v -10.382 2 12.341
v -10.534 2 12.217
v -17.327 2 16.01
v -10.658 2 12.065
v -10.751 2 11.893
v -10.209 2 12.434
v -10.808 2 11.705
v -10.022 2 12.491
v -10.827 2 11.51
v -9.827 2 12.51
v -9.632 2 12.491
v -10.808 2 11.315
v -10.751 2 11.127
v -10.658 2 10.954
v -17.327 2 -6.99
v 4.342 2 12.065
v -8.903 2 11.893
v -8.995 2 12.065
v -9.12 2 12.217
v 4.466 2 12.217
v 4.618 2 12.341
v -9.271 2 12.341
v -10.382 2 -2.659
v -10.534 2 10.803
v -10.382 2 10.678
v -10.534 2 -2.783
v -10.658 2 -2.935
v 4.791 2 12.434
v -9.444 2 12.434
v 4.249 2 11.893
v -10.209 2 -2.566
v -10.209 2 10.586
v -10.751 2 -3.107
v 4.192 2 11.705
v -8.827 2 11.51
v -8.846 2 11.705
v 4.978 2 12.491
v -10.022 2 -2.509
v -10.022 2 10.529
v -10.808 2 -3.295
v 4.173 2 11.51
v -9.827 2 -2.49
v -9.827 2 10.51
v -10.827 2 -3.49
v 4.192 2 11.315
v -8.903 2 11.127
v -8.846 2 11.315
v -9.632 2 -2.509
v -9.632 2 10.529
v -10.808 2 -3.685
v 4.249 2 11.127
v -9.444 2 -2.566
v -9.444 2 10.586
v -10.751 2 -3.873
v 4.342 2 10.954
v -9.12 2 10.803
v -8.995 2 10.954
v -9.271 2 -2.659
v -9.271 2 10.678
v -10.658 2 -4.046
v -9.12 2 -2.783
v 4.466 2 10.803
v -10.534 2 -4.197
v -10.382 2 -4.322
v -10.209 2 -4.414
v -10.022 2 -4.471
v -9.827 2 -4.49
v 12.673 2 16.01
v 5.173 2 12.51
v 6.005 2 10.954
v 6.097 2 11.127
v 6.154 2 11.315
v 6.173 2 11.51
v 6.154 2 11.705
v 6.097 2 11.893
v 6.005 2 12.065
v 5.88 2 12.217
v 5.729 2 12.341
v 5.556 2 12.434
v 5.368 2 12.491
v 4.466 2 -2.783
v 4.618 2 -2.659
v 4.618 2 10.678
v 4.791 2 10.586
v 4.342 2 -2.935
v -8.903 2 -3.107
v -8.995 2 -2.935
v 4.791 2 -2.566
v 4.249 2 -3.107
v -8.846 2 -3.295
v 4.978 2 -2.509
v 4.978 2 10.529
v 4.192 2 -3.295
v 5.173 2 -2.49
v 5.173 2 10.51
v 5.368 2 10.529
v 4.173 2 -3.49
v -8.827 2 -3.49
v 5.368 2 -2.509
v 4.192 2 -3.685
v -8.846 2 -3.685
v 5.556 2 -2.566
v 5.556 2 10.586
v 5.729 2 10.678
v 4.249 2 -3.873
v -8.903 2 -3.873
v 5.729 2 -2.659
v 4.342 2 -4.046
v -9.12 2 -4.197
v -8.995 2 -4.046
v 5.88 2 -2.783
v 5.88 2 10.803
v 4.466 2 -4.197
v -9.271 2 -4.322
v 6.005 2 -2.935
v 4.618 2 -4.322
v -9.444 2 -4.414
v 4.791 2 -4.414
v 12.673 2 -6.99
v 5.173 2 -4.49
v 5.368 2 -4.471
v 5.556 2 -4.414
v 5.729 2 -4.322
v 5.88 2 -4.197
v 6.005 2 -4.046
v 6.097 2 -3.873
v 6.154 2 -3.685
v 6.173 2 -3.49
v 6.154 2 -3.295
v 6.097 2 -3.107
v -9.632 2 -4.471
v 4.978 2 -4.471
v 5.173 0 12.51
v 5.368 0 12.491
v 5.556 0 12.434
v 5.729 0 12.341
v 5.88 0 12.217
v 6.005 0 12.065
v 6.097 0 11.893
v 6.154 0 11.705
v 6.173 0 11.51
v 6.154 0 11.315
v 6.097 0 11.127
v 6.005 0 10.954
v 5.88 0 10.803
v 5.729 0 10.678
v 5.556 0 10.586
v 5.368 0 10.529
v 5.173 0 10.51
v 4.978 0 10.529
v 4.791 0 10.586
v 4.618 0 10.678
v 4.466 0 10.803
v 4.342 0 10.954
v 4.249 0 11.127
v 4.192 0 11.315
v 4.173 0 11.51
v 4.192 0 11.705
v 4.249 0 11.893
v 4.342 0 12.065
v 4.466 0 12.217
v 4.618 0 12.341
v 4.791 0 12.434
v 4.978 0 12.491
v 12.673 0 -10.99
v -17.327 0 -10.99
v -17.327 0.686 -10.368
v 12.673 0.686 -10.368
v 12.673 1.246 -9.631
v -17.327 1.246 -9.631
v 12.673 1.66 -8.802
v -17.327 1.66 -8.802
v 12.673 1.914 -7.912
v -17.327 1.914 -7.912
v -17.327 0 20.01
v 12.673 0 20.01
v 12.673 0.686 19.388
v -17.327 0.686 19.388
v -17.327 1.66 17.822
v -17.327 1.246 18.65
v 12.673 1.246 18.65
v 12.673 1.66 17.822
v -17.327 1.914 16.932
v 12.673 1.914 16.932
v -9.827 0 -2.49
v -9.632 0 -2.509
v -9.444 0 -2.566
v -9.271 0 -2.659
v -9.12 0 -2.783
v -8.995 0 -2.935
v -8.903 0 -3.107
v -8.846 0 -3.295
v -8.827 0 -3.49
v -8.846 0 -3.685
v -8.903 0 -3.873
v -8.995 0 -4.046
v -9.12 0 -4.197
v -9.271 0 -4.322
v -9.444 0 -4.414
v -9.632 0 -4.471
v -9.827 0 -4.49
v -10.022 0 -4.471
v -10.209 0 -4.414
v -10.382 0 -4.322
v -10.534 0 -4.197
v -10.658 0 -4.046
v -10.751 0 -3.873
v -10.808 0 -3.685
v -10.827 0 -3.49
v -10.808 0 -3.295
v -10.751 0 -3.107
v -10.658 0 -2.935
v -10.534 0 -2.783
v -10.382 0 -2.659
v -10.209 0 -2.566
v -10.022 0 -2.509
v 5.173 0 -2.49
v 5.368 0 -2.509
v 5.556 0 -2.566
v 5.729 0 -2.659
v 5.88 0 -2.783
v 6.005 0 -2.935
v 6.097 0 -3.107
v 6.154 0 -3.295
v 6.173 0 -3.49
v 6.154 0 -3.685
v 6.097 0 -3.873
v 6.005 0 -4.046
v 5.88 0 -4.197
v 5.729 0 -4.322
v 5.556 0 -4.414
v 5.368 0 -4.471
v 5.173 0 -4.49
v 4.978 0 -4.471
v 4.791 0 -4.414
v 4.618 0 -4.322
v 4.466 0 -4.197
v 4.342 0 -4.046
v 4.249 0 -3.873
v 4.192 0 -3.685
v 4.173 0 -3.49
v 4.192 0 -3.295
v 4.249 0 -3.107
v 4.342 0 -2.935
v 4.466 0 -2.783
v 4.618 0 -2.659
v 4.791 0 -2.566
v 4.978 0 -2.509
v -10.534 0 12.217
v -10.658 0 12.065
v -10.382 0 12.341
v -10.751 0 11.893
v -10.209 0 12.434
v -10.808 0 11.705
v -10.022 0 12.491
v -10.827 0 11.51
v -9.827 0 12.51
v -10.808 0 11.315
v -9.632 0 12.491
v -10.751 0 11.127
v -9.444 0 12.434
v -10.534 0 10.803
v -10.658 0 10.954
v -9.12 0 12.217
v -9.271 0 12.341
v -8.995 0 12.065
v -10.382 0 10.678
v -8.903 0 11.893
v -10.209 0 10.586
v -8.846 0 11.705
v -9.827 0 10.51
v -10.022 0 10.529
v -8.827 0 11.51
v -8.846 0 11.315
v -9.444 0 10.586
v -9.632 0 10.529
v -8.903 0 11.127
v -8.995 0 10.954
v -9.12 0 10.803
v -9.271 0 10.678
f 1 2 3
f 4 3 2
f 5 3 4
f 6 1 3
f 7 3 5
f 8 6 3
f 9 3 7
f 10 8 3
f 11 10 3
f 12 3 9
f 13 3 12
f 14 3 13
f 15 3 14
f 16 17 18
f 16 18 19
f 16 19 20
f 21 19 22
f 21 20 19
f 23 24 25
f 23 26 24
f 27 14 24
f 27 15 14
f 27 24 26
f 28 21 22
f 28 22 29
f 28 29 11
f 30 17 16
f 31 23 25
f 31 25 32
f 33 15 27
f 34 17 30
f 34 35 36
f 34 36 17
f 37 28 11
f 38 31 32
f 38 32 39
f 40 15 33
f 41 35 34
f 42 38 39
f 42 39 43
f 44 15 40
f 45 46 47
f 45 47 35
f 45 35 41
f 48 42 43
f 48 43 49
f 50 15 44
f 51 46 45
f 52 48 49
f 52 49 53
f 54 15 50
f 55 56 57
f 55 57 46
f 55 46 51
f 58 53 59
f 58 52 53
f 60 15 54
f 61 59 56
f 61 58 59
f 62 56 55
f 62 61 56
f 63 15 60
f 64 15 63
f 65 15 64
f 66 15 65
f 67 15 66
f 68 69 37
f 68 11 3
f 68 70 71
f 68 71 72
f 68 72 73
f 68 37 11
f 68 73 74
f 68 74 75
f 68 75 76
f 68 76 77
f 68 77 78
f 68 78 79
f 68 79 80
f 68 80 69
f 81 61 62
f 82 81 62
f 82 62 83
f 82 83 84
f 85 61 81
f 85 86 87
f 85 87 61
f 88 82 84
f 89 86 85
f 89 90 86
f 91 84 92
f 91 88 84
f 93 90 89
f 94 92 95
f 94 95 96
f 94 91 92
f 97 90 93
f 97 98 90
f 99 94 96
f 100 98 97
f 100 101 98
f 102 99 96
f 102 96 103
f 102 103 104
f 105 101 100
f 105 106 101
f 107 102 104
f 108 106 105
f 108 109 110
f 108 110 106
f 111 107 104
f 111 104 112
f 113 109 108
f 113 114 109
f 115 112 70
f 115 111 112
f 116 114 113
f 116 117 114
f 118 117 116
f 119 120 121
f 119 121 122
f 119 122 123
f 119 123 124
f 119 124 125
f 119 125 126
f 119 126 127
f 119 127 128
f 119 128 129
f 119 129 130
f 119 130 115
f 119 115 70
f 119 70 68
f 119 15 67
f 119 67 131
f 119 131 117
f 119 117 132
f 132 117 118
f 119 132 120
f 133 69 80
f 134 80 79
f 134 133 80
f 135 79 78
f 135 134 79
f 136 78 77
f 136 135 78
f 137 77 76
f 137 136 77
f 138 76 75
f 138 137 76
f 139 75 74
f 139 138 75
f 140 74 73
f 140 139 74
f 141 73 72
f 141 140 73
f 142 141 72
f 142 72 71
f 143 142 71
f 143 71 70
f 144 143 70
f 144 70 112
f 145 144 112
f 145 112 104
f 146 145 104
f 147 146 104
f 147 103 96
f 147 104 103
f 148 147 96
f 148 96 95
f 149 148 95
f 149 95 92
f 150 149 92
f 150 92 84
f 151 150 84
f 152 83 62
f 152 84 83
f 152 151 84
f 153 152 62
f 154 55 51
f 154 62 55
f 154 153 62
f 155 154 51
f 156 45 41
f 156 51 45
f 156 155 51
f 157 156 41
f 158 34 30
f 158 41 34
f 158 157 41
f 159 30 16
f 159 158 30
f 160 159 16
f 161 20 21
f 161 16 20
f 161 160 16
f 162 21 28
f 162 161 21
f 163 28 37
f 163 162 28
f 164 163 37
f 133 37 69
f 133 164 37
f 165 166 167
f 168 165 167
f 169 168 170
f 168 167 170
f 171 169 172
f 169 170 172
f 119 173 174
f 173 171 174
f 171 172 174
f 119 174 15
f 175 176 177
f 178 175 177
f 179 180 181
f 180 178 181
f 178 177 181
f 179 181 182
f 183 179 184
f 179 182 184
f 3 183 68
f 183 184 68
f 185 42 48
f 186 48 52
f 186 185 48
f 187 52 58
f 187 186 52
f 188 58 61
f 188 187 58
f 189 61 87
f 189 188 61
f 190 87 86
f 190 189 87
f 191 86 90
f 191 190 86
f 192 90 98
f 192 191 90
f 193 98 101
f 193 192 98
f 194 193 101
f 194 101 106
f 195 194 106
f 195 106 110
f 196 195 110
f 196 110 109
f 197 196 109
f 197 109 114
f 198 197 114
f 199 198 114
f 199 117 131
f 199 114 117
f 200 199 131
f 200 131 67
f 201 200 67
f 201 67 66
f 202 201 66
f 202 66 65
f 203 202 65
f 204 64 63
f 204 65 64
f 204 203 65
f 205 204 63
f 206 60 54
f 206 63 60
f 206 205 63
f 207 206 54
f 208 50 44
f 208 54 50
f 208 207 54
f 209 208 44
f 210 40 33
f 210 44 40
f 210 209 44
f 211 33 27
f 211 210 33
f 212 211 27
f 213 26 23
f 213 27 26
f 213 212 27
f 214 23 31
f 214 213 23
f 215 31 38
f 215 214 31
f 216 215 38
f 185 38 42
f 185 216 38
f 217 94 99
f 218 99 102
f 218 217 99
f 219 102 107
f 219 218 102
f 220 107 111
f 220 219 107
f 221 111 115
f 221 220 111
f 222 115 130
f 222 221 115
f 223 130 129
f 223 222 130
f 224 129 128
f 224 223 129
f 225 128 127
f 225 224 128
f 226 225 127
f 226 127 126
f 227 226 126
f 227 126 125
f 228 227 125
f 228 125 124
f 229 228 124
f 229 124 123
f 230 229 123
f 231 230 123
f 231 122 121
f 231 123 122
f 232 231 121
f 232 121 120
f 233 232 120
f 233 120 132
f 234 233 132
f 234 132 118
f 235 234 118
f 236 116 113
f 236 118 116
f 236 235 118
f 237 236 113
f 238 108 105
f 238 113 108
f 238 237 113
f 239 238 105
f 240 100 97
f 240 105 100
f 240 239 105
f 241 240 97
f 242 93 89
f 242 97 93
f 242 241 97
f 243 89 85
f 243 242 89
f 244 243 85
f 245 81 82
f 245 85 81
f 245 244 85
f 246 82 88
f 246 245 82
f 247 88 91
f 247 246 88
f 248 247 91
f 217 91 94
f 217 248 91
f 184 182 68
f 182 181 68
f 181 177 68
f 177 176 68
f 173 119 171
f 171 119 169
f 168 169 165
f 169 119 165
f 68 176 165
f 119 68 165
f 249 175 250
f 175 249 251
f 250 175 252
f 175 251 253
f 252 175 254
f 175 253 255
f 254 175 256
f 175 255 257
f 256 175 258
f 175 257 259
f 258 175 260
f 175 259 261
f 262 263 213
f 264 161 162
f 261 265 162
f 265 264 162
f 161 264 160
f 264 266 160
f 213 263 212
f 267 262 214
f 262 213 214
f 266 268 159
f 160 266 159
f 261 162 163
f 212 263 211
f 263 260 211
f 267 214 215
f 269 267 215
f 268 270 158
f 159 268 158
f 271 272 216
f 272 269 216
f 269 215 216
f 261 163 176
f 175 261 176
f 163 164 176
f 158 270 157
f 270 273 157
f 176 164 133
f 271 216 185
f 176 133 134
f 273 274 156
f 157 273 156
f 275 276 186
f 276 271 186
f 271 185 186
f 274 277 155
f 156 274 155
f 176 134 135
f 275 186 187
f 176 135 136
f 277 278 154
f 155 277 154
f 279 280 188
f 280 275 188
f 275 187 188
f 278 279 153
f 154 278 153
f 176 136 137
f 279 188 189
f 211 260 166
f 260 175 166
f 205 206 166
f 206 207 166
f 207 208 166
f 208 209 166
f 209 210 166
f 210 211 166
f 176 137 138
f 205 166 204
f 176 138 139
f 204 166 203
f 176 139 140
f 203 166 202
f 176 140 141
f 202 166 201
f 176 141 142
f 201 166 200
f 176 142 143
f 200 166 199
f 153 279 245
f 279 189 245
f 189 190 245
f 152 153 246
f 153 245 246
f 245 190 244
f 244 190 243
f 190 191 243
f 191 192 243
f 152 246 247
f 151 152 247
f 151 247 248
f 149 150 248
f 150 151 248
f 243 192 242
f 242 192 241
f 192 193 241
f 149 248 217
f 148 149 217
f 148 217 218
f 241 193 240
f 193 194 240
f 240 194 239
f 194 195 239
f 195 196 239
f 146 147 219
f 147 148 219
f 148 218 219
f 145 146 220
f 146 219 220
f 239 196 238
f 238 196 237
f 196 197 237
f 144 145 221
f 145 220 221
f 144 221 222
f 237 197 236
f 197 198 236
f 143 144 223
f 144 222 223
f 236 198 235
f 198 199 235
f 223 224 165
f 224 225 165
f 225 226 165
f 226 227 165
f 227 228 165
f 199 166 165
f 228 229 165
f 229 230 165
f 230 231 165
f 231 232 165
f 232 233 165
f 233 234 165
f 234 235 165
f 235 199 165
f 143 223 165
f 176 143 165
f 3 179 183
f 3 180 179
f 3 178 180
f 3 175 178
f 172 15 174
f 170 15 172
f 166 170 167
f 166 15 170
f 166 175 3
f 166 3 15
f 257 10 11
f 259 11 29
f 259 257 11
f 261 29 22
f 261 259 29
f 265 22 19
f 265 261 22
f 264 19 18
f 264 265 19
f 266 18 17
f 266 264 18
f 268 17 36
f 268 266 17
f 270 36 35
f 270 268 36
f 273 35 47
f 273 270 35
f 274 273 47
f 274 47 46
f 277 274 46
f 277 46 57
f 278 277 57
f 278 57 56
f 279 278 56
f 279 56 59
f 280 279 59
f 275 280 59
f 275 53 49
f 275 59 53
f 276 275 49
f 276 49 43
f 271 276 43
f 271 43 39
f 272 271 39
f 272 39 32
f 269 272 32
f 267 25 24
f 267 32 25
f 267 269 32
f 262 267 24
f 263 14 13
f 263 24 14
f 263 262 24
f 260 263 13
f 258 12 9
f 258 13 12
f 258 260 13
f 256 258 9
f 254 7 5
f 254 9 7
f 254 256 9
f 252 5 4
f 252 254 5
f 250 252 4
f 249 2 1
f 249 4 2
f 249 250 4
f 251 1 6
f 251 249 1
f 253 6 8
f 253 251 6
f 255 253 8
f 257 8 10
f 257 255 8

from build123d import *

# Parameters (mm, degrees)
SKETCH1_W           = 30
SKETCH1_H           = 31
BOSS_EXTRUDE1_DEPTH = 2
SKETCH2_R           = 1
CUT_EXTRUDE2_DEPTH  = 4
FILLET2_R           = 5
FILLET3_R           = 5


with BuildPart() as part:
    # Sketch1 → Boss-Extrude1 (new body)
    with BuildSketch(Plane(origin=(0, 0, 0), x_dir=(1, 0, 0), z_dir=(0, 1, 0))):
        with Locations((-2.326732673, -4.50990099)):
            Rectangle(SKETCH1_W, SKETCH1_H)
    extrude(amount=BOSS_EXTRUDE1_DEPTH)

    # Sketch2 → Cut-Extrude2 (cut)
    with BuildSketch(Plane(origin=(0, 0, 0), x_dir=(1, 0, 0), z_dir=(0, 1, 0))):
        with Locations(Location((-9.826732673, 3.49009901, 0), (0, 0, 270))):
            Circle(SKETCH2_R)
        with Locations(Location((-9.826732673, -11.50990099, 0), (0, 0, 270))):
            Circle(SKETCH2_R)
        with Locations(Location((5.173267327, 3.49009901, 0), (0, 0, 270))):
            Circle(SKETCH2_R)
        with Locations(Location((5.173267327, -11.50990099, 0), (0, 0, 270))):
            Circle(SKETCH2_R)
    extrude(amount=CUT_EXTRUDE2_DEPTH, mode=Mode.SUBTRACT)

    # Fillet2
    # the kernel refuses this fillet: 5 mm, written as the material it takes off along each edge
    with BuildSketch(Plane(origin=(22.673267327, 2, 20.00990099), x_dir=(0, 0, -1), z_dir=(-1, 0, 0))) as fillet2_piece_1:
        with BuildLine():
            CenterArc((4, 5), FILLET2_R, 216.869897646, 53.130102354)
            Line((0, 2), (-0.08, 1.94))
            ThreePointArc((-0.08, 1.94), (-0.1, 1), (-0.1, 0))
            Line((-0.1, 0), (0, -0.1))
            Line((0, -0.1), (4, -0.1))
            Line((4, -0.1), (4, 0))
        make_face()
    extrude(amount=50, mode=Mode.SUBTRACT)

    # Fillet3
    # the kernel refuses this fillet: 5 mm, written as the material it takes off along each edge
    with BuildSketch(Plane(origin=(-27.326732673, 2, -10.99009901), x_dir=(0, -1, 0), z_dir=(1, 0, 0))) as fillet3_piece_1:
        with BuildLine():
            CenterArc((5, -4), FILLET3_R, 126.869897646, 53.130102354)
            Line((0, -4), (-0.1, -4))
            Line((-0.1, -4), (-0.1, 0))
            Line((-0.1, 0), (0, 0.1))
            ThreePointArc((0, 0.1), (1, 0.1), (1.94, 0.08))
            Line((1.94, 0.08), (2, 0))
        make_face()
    extrude(amount=50, mode=Mode.SUBTRACT)


solid = part.part
